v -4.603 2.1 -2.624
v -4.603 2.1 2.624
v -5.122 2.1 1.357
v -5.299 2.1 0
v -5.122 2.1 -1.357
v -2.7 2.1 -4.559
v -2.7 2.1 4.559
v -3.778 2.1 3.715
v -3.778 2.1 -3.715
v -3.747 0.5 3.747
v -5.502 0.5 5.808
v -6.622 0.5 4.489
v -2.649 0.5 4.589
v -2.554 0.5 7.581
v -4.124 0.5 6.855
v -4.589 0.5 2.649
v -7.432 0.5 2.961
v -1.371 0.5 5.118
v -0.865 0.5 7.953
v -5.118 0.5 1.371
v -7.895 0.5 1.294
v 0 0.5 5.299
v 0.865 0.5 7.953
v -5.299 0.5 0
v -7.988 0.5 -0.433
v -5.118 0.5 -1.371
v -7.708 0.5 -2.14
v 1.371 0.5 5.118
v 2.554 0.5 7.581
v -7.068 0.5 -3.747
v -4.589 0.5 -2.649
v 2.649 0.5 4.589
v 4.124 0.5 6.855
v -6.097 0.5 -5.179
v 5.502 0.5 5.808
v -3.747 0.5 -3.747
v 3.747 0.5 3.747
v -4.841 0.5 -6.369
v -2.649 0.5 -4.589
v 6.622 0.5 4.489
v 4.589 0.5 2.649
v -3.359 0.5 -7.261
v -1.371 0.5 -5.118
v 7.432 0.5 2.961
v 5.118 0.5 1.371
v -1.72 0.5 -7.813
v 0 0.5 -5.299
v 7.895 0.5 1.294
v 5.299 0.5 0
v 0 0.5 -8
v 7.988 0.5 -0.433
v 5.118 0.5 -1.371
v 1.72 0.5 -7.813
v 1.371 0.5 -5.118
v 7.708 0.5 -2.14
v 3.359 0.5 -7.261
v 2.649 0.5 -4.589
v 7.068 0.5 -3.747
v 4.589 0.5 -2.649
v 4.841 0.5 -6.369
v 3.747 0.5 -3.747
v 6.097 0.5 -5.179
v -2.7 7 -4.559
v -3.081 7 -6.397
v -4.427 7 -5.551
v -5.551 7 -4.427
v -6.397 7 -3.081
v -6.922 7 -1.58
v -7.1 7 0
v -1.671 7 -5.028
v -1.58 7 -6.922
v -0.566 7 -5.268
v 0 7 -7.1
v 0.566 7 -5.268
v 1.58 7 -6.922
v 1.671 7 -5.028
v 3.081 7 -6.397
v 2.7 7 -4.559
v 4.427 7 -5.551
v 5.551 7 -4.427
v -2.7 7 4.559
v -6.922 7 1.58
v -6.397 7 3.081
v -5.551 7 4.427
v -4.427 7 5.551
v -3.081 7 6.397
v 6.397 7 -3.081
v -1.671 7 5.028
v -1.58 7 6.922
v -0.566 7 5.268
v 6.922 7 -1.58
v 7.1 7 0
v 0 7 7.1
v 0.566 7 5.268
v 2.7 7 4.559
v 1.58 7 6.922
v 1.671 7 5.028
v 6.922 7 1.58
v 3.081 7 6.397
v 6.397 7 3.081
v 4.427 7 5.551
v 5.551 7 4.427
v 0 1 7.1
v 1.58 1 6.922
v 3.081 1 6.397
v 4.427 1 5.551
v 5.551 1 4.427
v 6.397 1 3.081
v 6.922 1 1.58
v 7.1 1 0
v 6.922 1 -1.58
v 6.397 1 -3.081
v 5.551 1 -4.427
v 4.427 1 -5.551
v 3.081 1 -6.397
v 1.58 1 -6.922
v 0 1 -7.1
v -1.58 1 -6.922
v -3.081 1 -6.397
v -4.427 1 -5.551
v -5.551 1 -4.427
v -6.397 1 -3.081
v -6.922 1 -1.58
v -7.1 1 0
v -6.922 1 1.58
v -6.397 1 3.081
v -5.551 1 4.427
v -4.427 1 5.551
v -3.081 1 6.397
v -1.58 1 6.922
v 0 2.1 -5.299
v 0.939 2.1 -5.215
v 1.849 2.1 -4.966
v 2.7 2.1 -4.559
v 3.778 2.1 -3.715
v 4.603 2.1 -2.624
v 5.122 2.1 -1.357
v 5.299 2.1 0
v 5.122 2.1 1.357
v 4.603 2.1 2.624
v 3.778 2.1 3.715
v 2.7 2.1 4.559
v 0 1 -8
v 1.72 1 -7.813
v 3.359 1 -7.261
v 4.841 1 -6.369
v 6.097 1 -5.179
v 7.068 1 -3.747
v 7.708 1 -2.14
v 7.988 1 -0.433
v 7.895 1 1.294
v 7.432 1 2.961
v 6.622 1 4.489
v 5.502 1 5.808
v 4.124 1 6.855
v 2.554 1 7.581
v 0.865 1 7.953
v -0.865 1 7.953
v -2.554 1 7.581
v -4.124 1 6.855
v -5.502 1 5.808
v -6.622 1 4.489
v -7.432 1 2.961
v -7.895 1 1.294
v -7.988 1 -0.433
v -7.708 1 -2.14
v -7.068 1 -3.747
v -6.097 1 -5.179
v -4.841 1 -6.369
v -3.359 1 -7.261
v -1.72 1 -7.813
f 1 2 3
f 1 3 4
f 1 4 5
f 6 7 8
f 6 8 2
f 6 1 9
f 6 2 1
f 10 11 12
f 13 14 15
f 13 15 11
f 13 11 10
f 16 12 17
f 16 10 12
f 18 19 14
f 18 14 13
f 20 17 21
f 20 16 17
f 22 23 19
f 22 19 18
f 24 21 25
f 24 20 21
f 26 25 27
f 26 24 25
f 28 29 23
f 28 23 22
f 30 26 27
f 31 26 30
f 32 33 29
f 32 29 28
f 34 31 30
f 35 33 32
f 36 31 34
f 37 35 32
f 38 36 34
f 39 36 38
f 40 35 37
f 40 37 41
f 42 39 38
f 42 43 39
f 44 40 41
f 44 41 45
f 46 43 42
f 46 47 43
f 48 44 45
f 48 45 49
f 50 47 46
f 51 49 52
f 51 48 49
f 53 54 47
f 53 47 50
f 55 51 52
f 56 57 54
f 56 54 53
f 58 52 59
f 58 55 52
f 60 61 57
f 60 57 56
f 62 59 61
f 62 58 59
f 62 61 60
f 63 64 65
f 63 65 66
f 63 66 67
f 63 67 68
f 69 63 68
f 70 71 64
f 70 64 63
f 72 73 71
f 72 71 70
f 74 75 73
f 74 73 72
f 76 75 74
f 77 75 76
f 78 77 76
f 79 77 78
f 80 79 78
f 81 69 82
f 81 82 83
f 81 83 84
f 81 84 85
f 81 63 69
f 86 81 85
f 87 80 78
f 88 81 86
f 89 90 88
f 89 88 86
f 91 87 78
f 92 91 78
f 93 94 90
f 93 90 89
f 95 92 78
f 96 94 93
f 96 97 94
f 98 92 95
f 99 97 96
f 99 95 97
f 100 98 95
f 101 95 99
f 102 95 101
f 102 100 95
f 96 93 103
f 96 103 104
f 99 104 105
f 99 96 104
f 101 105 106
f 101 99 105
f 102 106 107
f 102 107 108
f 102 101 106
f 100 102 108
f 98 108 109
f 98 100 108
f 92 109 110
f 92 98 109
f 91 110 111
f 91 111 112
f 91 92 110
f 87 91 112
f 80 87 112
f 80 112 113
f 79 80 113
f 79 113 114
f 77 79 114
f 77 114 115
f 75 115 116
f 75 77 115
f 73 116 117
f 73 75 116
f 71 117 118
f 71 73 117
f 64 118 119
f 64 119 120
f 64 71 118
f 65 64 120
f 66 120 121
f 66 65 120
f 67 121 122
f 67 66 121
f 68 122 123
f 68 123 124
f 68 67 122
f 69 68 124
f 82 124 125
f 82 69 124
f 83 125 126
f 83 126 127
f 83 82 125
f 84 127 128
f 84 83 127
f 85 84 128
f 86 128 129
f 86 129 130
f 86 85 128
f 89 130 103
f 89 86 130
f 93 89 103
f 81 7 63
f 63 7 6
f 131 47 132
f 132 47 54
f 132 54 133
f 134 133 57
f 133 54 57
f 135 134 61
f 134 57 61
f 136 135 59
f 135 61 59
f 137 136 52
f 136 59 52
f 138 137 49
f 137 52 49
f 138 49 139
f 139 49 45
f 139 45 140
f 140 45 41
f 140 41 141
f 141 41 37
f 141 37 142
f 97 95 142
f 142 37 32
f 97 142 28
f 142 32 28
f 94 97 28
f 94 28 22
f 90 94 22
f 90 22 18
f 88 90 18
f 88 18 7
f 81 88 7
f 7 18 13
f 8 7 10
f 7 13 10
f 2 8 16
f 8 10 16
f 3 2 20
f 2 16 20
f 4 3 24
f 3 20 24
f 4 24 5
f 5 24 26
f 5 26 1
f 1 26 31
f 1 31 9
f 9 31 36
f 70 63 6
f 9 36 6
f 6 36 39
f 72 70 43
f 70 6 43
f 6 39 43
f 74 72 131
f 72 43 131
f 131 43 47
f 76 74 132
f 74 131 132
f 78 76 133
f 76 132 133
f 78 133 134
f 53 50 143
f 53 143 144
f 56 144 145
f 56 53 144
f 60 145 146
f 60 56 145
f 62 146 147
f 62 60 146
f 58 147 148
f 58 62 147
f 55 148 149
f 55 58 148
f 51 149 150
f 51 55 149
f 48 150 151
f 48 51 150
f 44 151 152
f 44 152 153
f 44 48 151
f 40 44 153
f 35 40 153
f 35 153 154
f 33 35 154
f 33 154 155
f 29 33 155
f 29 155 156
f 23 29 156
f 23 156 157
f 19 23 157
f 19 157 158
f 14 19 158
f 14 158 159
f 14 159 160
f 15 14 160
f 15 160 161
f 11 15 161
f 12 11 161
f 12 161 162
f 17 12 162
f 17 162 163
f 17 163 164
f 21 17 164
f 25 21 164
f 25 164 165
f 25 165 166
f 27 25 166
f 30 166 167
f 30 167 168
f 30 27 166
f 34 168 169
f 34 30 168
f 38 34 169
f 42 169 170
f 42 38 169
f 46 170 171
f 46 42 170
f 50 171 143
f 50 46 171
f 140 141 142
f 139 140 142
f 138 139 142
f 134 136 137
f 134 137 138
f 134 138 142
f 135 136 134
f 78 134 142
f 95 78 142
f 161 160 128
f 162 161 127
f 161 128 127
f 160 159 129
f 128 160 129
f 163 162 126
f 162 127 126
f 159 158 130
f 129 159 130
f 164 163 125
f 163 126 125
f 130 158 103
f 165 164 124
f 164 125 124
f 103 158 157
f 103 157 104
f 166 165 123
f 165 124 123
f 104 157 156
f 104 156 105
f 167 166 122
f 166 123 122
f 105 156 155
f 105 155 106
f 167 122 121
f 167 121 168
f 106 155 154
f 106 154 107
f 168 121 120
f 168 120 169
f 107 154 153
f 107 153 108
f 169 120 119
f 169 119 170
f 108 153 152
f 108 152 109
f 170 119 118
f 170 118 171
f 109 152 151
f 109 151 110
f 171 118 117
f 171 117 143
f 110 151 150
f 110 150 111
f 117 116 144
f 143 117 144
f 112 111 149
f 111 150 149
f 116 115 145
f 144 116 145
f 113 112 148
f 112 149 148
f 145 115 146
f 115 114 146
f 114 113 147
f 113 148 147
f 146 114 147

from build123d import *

# Parameters (mm, degrees)
SKETCH1_R           = 7
BOSS_EXTRUDE1_DEPTH = 7
SKETCH2_R           = 2.7
CUT_EXTRUDE2_DEPTH  = 10
SKETCH3_R           = 8
SKETCH3_W           = 5.4
SKETCH3_H           = 8.674169728
BOSS_EXTRUDE2_DEPTH = 1
SKETCH4_R           = 8
CUT_EXTRUDE3_DEPTH  = 0.5
SKETCH5_R           = 7.1
SKETCH5_W           = 5.4
SKETCH5_H           = 8.674169728
BOSS_EXTRUDE3_DEPTH = 6
SKETCH6_R           = 5.108845772
CUT_EXTRUDE4_DEPTH  = 1.1
CUT_EXTRUDE5_DEPTH  = 10.1
SKETCH9_R           = 5.298635414
CUT_EXTRUDE6_DEPTH  = 1.6
CUT_EXTRUDE7_DEPTH  = 10.6


with BuildPart() as part:
    # Sketch1 → Boss-Extrude1 (new body)
    with BuildSketch(Plane(origin=(0, 0, 0), x_dir=(1, 0, 0), z_dir=(0, 1, 0))):
        with Locations(Location((0, 0, 0), (0, 0, 270))):
            Circle(SKETCH1_R)
    extrude(amount=BOSS_EXTRUDE1_DEPTH)

    # Sketch2 → Cut-Extrude2 (cut)
    with BuildSketch(Plane.XZ):
        with BuildLine():
            Line((2.7, 4.337084864), (-2.7, 4.337084864))
            Line((-2.7, 4.337084864), (-2.7, 0))
            ThreePointArc((-2.7, 0), (0, 2.7), (2.7, 0))
            Line((2.7, 0), (2.7, 4.337084864))
        make_face()
        with BuildLine():
            ThreePointArc((2.7, 0), (0, -2.7), (-2.7, 0))
            Line((-2.7, 0), (-2.7, -4.337084864))
            Line((-2.7, -4.337084864), (2.7, -4.337084864))
            Line((2.7, -4.337084864), (2.7, 0))
        make_face()
        Circle(SKETCH2_R)
    extrude(amount=-CUT_EXTRUDE2_DEPTH, mode=Mode.SUBTRACT)

    # Sketch3 → Boss-Extrude2 (add)
    with BuildSketch(Plane.XZ):
        with Locations(Location((0, 0, 0), (0, 0, 270))):
            Circle(SKETCH3_R)
        Rectangle(SKETCH3_W, SKETCH3_H, mode=Mode.SUBTRACT)
    extrude(amount=-BOSS_EXTRUDE2_DEPTH)

    # Sketch4 → Cut-Extrude3 (cut)
    with BuildSketch(Plane.XZ):
        with Locations(Location((0, 0, 0), (0, 0, 270))):
            Circle(SKETCH4_R)
    extrude(amount=-CUT_EXTRUDE3_DEPTH, mode=Mode.SUBTRACT)

    # Sketch5 → Boss-Extrude3 (add)
    with BuildSketch(Plane(origin=(0, 7, 0), x_dir=(1, 0, 0), z_dir=(0, 1, 0))):
        with Locations(Location((0, 0, 0), (0, 0, 270))):
            Circle(SKETCH5_R)
        Rectangle(SKETCH5_W, SKETCH5_H, mode=Mode.SUBTRACT)
    extrude(amount=-BOSS_EXTRUDE3_DEPTH)

    # Sketch6 → Cut-Extrude4 (cut)
    with BuildSketch(Plane.XZ.offset(-0.5)):
        with Locations(Location((0, 0, 0), (0, 0, 270))):
            Circle(SKETCH6_R)
    extrude(amount=-CUT_EXTRUDE4_DEPTH, mode=Mode.SUBTRACT)

    # Sketch8 → Cut-Extrude5 (cut)
    with BuildSketch(Plane.XZ.offset(-1.6)):
        with BuildLine():
            Line((-2.7, 4.337084864), (2.7, 4.337084864))
            ThreePointArc((2.7, 4.337084864), (0, 5.108845772), (-2.7, 4.337084864))
        make_face()
        with BuildLine():
            Line((2.7, -4.337084864), (-2.7, -4.337084864))
            ThreePointArc((-2.7, -4.337084864), (0, -5.108845772), (2.7, -4.337084864))
        make_face()
    extrude(amount=-CUT_EXTRUDE5_DEPTH, mode=Mode.SUBTRACT)

    # Sketch9 → Cut-Extrude6 (cut)
    with BuildSketch(Plane.XZ.offset(-0.5)):
        with Locations(Location((0, 0, 0), (0, 0, 270))):
            Circle(SKETCH9_R)
    extrude(amount=-CUT_EXTRUDE6_DEPTH, mode=Mode.SUBTRACT)

    # Sketch10 → Cut-Extrude7 (cut)
    with BuildSketch(Plane.XZ.offset(-2.1)):
        with BuildLine():
            Line((-2.7, -4.337084864), (-2.7, -4.55911584))
            ThreePointArc((-2.7, -4.55911584), (0, -5.298635414), (2.7, -4.55911584))
            Line((2.7, -4.55911584), (2.7, -4.337084864))
            ThreePointArc((2.7, -4.337084864), (0, -5.108845772), (-2.7, -4.337084864))
        make_face()
        with BuildLine():
            Line((-2.7, 4.55911584), (-2.7, 4.337084864))
            ThreePointArc((-2.7, 4.337084864), (0, 5.108845772), (2.7, 4.337084864))
            Line((2.7, 4.337084864), (2.7, 4.55911584))
            ThreePointArc((2.7, 4.55911584), (0, 5.298635414), (-2.7, 4.55911584))
        make_face()
    extrude(amount=-CUT_EXTRUDE7_DEPTH, mode=Mode.SUBTRACT)


solid = part.part
